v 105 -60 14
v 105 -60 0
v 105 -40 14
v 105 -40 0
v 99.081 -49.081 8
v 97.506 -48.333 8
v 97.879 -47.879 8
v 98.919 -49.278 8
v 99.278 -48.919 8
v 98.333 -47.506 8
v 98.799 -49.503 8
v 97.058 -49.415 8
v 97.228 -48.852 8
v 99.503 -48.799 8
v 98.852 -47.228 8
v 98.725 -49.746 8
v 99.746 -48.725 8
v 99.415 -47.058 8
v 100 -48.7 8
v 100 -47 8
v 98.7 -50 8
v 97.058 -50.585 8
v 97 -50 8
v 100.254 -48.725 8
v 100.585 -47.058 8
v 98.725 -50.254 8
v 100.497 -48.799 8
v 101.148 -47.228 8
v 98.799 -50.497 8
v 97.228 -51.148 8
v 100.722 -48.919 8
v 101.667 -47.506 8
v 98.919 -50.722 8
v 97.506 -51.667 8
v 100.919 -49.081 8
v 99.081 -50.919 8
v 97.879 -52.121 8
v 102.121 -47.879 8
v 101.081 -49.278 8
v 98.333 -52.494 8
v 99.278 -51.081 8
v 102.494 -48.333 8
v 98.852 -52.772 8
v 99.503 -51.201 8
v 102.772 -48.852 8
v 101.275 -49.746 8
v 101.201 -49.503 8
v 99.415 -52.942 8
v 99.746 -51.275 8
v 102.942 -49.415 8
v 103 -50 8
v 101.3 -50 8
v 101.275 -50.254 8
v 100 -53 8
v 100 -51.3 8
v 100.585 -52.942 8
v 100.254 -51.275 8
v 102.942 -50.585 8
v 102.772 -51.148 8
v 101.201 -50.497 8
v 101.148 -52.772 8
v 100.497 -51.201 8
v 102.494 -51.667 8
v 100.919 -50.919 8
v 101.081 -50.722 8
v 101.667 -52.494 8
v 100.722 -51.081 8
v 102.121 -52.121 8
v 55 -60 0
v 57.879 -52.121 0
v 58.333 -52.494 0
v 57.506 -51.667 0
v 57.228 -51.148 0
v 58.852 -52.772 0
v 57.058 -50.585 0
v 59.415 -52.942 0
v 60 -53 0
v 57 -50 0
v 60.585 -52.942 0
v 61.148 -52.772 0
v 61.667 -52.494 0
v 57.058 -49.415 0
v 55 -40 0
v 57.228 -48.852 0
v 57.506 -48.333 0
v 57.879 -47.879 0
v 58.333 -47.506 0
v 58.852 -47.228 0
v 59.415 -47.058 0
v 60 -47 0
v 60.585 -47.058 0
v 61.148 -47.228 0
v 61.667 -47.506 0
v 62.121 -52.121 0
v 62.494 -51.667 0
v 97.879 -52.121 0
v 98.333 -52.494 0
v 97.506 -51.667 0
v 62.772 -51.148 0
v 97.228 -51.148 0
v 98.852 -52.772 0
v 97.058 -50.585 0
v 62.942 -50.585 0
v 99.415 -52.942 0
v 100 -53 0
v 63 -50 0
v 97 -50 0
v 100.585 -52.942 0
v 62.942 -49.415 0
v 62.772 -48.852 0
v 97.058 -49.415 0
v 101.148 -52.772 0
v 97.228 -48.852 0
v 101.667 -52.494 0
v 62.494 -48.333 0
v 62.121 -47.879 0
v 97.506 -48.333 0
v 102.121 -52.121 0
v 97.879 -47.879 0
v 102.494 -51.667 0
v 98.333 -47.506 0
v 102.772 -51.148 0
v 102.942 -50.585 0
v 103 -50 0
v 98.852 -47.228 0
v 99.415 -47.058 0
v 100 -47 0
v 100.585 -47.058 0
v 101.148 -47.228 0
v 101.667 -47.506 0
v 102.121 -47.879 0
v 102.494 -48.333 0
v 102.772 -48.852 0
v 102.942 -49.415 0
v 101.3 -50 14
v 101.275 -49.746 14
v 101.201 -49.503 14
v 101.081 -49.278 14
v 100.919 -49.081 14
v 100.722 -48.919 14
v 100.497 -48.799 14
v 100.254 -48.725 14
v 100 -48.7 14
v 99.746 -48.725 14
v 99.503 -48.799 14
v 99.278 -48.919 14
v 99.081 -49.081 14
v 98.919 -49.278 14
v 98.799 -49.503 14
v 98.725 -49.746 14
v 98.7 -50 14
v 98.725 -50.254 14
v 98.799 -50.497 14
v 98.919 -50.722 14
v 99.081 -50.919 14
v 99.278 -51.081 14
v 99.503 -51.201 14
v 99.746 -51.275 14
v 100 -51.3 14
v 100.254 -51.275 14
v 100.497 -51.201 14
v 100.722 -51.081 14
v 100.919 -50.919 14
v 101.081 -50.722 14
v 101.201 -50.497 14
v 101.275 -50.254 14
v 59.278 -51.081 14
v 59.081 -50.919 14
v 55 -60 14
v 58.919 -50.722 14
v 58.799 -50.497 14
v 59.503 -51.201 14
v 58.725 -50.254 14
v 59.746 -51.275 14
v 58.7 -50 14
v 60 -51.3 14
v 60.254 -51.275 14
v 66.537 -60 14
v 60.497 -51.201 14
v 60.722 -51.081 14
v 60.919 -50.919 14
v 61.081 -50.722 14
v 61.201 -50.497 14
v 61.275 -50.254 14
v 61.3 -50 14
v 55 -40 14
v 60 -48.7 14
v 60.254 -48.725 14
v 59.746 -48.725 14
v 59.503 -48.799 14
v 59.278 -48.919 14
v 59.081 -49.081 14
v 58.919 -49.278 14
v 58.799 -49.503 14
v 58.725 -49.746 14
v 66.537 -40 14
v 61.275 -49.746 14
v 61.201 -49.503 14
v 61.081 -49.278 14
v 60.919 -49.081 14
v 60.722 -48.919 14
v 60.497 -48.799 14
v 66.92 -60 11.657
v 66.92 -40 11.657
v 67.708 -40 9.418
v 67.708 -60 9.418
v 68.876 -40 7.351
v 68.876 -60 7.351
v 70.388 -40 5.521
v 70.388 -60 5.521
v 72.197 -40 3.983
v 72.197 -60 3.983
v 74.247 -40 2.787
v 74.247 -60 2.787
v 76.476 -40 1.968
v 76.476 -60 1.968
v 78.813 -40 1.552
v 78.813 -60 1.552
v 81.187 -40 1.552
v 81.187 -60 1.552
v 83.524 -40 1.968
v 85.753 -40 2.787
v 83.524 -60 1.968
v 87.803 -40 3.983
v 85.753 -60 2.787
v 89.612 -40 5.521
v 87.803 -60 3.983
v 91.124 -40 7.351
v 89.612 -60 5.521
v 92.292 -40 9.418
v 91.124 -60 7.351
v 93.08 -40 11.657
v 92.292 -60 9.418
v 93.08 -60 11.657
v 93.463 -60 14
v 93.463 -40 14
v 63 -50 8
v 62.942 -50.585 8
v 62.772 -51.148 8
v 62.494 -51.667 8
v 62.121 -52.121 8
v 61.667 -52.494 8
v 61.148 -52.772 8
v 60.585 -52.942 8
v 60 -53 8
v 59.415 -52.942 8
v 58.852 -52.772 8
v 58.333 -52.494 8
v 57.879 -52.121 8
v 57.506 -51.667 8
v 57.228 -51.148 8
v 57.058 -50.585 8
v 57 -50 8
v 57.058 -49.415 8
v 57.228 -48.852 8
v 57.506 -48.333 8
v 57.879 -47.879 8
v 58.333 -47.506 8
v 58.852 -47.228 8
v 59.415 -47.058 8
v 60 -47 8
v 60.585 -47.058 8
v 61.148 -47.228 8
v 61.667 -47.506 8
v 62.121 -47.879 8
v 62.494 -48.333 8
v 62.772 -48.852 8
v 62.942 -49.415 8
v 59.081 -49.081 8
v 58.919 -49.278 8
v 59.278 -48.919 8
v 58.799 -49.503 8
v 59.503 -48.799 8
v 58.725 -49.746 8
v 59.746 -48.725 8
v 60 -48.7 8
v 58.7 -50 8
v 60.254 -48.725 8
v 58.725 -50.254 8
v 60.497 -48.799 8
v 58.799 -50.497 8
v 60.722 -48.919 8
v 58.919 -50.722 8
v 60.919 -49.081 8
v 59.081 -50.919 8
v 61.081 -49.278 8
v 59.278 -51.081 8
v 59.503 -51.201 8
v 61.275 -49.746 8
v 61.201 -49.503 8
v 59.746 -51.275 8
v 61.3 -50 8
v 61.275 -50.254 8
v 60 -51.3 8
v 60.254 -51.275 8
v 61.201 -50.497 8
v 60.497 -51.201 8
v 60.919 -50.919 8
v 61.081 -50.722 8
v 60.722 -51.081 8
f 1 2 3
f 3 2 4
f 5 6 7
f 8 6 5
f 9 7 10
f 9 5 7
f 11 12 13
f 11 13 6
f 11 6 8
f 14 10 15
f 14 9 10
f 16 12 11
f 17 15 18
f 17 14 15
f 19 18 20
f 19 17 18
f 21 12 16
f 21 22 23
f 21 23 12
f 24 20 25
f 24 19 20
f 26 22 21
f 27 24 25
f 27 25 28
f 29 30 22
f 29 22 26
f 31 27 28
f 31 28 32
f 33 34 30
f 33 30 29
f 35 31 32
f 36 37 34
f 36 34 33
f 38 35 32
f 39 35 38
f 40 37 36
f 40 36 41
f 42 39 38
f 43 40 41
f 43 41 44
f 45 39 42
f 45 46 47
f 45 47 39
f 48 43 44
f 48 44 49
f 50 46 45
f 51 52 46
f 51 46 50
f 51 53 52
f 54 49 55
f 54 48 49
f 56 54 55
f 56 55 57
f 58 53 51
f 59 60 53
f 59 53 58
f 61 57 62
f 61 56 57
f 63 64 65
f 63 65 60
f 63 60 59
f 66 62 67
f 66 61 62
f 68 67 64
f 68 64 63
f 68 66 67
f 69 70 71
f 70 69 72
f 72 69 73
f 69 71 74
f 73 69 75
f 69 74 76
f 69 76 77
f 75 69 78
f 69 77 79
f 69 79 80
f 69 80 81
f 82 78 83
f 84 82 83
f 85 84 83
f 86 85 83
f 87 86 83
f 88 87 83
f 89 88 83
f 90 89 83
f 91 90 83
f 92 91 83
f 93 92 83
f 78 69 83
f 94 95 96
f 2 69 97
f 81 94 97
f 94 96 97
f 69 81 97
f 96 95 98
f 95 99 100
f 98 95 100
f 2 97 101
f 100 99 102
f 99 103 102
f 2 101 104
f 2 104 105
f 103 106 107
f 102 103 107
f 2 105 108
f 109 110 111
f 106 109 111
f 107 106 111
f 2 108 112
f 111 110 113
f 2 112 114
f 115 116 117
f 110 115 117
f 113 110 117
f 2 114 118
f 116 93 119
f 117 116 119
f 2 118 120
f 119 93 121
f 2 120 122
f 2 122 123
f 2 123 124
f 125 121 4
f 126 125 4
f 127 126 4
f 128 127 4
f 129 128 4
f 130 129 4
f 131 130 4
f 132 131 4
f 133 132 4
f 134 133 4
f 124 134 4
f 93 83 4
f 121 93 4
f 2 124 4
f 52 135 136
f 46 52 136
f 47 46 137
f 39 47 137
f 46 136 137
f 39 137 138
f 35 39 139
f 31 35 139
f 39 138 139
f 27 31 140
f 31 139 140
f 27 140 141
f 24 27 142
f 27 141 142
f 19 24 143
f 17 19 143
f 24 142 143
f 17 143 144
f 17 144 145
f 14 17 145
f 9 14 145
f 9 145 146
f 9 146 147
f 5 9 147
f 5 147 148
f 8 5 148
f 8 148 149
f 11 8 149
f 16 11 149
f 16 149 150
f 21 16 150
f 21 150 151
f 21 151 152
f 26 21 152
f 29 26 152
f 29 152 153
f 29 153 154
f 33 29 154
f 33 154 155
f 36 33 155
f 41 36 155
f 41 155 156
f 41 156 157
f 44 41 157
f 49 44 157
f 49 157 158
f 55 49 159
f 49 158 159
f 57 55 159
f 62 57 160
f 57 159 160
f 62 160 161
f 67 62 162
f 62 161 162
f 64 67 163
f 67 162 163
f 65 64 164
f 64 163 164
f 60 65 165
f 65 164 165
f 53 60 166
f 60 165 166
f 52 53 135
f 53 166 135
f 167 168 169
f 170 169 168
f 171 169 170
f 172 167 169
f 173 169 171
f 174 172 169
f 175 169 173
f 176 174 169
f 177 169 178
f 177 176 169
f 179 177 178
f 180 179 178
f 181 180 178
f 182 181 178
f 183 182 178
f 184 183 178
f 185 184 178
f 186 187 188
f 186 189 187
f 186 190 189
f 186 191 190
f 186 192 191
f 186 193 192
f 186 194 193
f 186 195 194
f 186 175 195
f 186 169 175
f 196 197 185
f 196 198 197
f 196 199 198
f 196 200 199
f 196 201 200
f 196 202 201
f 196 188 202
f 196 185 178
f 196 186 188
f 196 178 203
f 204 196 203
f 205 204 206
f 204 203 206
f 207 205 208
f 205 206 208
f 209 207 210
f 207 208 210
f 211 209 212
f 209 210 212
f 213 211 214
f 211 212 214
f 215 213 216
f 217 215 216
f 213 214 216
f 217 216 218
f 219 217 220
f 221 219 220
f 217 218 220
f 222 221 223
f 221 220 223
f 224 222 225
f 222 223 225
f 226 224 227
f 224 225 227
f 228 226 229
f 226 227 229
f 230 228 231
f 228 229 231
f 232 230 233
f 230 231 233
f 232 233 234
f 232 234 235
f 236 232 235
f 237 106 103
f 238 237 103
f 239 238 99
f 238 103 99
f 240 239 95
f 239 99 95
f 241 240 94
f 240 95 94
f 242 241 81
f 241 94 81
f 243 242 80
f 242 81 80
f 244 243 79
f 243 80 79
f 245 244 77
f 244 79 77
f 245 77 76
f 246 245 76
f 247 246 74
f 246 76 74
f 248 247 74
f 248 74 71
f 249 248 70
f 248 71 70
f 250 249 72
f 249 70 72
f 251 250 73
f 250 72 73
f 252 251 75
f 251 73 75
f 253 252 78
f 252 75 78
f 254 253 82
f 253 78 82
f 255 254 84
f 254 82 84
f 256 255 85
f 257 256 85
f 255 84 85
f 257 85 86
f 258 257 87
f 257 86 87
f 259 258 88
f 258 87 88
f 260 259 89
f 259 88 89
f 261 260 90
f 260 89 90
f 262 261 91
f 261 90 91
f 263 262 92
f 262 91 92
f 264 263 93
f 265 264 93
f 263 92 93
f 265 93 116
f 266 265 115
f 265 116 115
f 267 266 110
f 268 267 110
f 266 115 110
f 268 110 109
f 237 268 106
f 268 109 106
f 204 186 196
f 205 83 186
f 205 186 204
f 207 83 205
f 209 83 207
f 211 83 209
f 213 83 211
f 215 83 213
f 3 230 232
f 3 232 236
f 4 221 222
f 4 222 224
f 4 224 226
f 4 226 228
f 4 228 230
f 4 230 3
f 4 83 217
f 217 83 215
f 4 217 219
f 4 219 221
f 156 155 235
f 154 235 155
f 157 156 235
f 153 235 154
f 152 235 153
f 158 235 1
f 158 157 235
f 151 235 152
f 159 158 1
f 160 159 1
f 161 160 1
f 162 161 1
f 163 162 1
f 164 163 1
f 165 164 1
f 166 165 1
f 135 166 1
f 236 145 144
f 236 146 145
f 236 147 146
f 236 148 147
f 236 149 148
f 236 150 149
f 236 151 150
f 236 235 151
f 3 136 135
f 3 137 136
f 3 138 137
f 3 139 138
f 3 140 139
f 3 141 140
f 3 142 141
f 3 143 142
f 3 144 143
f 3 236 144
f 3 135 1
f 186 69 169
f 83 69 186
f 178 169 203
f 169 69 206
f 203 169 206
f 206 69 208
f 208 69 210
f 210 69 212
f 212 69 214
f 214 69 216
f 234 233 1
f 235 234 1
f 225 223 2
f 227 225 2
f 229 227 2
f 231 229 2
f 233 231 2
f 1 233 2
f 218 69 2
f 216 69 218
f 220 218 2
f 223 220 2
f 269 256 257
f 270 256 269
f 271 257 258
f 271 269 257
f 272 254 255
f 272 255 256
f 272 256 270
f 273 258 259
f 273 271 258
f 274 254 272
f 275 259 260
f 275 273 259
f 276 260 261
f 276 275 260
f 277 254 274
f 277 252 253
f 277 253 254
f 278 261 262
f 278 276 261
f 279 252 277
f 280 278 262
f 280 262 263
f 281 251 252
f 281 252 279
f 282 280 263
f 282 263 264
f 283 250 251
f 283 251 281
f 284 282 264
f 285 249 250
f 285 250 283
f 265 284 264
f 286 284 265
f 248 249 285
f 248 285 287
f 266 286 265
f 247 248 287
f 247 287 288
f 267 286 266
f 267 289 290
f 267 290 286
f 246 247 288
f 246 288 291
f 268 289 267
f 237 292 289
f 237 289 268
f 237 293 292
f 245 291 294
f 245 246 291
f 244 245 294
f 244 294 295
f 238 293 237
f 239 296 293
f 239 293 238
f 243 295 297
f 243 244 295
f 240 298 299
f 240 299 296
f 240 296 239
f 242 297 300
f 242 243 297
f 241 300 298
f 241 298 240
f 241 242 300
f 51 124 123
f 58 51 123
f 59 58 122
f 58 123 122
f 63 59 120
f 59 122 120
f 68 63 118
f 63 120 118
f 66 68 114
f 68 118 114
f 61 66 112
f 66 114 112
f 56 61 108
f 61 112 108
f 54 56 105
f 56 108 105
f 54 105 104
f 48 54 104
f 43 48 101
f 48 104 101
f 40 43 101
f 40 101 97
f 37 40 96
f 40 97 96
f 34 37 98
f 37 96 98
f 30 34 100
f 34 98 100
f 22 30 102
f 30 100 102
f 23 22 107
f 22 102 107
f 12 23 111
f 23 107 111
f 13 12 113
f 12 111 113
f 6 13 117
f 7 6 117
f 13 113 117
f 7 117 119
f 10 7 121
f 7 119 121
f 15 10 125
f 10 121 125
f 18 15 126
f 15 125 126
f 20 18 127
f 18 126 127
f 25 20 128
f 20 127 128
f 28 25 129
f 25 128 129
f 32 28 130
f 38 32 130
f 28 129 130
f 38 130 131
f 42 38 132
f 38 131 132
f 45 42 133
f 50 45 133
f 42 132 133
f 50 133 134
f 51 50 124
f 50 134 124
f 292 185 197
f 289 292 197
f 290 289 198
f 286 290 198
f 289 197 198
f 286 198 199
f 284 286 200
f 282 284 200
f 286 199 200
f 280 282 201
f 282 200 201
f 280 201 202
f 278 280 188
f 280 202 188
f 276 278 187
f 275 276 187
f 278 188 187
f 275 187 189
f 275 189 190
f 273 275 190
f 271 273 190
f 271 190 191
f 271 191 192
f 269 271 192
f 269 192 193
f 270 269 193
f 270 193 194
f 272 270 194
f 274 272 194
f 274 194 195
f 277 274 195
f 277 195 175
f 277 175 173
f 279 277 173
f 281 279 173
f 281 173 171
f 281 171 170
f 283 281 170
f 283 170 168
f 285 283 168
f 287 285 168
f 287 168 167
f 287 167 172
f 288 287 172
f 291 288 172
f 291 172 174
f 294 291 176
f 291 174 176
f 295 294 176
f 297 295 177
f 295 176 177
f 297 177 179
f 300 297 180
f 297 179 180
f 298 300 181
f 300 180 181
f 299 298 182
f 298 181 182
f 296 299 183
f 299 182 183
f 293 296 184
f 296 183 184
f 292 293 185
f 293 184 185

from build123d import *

# Parameters (mm, degrees)
SKETCH003_W     = 50
SKETCH003_H     = 20
PAD001_DEPTH    = 14
SKETCH004_R     = 13.5
POCKET002_DEPTH = 20.001
SKETCH005_R     = 1.3
POCKET003_DEPTH = 14.001
SKETCH017_R     = 3
POCKET012_DEPTH = 8


with BuildPart() as part:
    # Sketch003 → Pad001 (new body)
    with BuildSketch(Plane.XY):
        Rectangle(SKETCH003_W, SKETCH003_H)
    extrude(amount=PAD001_DEPTH)

    # Sketch004 (on Face3 of Pad001) → Pocket002 (cut, through all)
    with BuildSketch(Plane.XZ.offset(10)):
        with Locations((0, 15)):
            Circle(SKETCH004_R)
    extrude(amount=-POCKET002_DEPTH, mode=Mode.SUBTRACT)

    # Sketch005 (on Face6 of Pocket002) → Pocket003 (cut, through all)
    with BuildSketch(Plane.XY.offset(14)):
        with Locations((-20, 0)):
            Circle(SKETCH005_R)
        with Locations((20, 0)):
            Circle(SKETCH005_R)
    extrude(amount=-POCKET003_DEPTH, mode=Mode.SUBTRACT)

    # Sketch017 (on Face2 of Pocket003) → Pocket012 (cut)
    with BuildSketch(Plane(origin=(0, 0, 0), x_dir=(1, 0, 0), z_dir=(0, 0, -1))):
        with Locations((-20, 0)):
            Circle(SKETCH017_R)
        with Locations((20, 0)):
            Circle(SKETCH017_R)
    extrude(amount=-POCKET012_DEPTH, mode=Mode.SUBTRACT)


with BuildPart() as part_1:
    # Body001 placement: moved
    add(part.part.moved(Location((80, -50, 0))))


solid = part_1.part
